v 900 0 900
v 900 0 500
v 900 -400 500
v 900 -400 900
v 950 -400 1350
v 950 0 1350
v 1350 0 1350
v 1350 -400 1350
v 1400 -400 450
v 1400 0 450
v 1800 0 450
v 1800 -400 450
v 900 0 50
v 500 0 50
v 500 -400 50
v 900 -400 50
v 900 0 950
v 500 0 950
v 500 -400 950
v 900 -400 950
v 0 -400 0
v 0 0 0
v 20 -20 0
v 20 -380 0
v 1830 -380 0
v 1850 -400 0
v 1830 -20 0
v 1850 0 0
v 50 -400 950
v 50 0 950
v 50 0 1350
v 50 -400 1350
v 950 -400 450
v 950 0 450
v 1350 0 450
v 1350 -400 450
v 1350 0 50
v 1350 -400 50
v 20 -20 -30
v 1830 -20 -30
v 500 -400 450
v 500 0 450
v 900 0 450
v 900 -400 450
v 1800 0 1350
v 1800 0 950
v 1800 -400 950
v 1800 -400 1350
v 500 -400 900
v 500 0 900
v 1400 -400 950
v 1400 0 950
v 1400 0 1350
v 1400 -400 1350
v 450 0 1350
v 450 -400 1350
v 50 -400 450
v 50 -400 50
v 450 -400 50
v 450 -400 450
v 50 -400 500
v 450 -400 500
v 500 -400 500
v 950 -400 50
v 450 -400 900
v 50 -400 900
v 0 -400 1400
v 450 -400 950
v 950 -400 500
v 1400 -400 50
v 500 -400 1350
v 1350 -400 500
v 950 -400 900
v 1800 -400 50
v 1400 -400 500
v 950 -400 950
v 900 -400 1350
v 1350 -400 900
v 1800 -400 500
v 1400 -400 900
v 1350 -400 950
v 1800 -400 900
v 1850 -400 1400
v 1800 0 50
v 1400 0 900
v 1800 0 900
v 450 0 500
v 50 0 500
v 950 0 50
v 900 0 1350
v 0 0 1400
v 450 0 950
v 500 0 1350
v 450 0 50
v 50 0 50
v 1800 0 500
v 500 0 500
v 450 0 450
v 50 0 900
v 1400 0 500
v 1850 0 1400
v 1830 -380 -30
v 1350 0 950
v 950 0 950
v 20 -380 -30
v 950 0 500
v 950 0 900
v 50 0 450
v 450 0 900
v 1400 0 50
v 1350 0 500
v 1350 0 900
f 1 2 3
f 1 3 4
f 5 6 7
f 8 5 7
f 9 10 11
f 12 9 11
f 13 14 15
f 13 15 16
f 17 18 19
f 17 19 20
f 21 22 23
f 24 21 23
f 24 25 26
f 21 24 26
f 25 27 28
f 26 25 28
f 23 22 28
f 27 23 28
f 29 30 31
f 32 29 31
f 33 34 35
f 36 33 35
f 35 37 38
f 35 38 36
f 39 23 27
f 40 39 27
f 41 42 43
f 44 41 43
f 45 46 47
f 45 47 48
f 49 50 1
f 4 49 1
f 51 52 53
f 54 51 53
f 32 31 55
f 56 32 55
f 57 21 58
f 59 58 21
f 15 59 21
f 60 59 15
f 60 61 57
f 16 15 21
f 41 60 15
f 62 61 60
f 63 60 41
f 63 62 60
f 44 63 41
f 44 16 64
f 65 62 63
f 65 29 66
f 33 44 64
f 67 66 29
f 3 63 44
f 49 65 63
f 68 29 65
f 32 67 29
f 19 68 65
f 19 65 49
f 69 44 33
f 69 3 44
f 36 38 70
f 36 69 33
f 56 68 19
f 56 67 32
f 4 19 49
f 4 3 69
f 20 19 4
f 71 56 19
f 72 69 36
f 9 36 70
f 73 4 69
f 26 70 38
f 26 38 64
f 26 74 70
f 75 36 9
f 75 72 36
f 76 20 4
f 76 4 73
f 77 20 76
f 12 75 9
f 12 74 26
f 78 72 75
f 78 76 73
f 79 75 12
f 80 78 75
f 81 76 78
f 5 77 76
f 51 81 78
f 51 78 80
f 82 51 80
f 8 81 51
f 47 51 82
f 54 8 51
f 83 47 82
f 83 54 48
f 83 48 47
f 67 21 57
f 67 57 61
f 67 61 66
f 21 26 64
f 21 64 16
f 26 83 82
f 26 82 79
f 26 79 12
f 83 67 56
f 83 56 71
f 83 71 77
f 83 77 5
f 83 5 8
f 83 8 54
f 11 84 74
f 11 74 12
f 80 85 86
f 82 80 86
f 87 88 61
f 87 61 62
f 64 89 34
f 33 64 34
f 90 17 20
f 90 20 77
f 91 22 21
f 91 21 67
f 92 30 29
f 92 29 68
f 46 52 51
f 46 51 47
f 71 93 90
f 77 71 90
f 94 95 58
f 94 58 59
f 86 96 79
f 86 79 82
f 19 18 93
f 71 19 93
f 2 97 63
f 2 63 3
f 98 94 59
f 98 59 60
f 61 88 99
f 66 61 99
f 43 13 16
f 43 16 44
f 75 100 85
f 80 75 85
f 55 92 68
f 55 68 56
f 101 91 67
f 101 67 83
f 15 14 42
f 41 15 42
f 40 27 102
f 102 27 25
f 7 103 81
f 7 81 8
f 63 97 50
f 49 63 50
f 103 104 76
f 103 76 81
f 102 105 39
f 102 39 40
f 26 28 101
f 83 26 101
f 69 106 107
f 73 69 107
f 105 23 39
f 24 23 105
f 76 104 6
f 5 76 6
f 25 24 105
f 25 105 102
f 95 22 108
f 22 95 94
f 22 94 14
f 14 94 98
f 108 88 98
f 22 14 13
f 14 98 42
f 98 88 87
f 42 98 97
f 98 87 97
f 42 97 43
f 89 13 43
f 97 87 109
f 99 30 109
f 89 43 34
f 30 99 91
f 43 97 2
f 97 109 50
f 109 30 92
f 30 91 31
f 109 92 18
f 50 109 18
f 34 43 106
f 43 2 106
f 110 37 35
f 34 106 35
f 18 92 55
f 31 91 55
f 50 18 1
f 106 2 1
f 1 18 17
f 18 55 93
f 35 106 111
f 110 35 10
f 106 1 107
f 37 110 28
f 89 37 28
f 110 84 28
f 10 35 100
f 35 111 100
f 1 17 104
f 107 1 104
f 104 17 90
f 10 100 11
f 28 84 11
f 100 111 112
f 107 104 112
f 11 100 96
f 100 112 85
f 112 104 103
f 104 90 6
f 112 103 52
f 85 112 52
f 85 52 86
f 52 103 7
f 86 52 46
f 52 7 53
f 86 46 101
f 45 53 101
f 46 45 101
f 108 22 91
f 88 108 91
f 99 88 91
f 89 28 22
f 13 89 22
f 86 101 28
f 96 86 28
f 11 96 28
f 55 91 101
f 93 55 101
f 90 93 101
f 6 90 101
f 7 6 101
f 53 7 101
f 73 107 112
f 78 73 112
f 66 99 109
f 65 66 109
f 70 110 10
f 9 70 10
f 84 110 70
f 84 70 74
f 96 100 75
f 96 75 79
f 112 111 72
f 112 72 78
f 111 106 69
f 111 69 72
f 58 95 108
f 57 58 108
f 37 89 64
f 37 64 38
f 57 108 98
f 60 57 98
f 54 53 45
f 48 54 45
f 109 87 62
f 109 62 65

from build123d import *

# Parameters (mm, degrees)
F0_W     = 1850
F0_H     = 1400
F0_W_2   = 400
F0_H_2   = 400
F1_DEPTH = 400
F2_W     = 1810
F2_H     = 360
F3_DEPTH = 30


with BuildPart() as f1:
    # F0 (on Front) → F1 (new body)
    with BuildSketch(Plane.XZ):
        with Locations((925, 700)):
            Rectangle(F0_W, F0_H)
        with Locations((250, 250)):
            Rectangle(F0_W_2, F0_H_2, mode=Mode.SUBTRACT)
        with Locations((700, 250)):
            Rectangle(F0_W_2, F0_H_2, mode=Mode.SUBTRACT)
        with Locations((1150, 250)):
            Rectangle(F0_W_2, F0_H_2, mode=Mode.SUBTRACT)
        with Locations((1600, 250)):
            Rectangle(F0_W_2, F0_H_2, mode=Mode.SUBTRACT)
        with Locations((250, 700)):
            Rectangle(F0_W_2, F0_H_2, mode=Mode.SUBTRACT)
        with Locations((700, 700)):
            Rectangle(F0_W_2, F0_H_2, mode=Mode.SUBTRACT)
        with Locations((250, 1150)):
            Rectangle(F0_W_2, F0_H_2, mode=Mode.SUBTRACT)
        with Locations((700, 1150)):
            Rectangle(F0_W_2, F0_H_2, mode=Mode.SUBTRACT)
        with Locations((1150, 700)):
            Rectangle(F0_W_2, F0_H_2, mode=Mode.SUBTRACT)
        with Locations((1600, 700)):
            Rectangle(F0_W_2, F0_H_2, mode=Mode.SUBTRACT)
        with Locations((1150, 1150)):
            Rectangle(F0_W_2, F0_H_2, mode=Mode.SUBTRACT)
        with Locations((1600, 1150)):
            Rectangle(F0_W_2, F0_H_2, mode=Mode.SUBTRACT)
    extrude(amount=F1_DEPTH)

    # F2 (on face) → F3 (join)
    with BuildSketch(Plane(origin=(0, 0, 0), x_dir=(1, 0, 0), z_dir=(0, 0, -1))):
        with Locations((925, 200)):
            Rectangle(F2_W, F2_H)
    extrude(amount=F3_DEPTH)


solid = f1.part
